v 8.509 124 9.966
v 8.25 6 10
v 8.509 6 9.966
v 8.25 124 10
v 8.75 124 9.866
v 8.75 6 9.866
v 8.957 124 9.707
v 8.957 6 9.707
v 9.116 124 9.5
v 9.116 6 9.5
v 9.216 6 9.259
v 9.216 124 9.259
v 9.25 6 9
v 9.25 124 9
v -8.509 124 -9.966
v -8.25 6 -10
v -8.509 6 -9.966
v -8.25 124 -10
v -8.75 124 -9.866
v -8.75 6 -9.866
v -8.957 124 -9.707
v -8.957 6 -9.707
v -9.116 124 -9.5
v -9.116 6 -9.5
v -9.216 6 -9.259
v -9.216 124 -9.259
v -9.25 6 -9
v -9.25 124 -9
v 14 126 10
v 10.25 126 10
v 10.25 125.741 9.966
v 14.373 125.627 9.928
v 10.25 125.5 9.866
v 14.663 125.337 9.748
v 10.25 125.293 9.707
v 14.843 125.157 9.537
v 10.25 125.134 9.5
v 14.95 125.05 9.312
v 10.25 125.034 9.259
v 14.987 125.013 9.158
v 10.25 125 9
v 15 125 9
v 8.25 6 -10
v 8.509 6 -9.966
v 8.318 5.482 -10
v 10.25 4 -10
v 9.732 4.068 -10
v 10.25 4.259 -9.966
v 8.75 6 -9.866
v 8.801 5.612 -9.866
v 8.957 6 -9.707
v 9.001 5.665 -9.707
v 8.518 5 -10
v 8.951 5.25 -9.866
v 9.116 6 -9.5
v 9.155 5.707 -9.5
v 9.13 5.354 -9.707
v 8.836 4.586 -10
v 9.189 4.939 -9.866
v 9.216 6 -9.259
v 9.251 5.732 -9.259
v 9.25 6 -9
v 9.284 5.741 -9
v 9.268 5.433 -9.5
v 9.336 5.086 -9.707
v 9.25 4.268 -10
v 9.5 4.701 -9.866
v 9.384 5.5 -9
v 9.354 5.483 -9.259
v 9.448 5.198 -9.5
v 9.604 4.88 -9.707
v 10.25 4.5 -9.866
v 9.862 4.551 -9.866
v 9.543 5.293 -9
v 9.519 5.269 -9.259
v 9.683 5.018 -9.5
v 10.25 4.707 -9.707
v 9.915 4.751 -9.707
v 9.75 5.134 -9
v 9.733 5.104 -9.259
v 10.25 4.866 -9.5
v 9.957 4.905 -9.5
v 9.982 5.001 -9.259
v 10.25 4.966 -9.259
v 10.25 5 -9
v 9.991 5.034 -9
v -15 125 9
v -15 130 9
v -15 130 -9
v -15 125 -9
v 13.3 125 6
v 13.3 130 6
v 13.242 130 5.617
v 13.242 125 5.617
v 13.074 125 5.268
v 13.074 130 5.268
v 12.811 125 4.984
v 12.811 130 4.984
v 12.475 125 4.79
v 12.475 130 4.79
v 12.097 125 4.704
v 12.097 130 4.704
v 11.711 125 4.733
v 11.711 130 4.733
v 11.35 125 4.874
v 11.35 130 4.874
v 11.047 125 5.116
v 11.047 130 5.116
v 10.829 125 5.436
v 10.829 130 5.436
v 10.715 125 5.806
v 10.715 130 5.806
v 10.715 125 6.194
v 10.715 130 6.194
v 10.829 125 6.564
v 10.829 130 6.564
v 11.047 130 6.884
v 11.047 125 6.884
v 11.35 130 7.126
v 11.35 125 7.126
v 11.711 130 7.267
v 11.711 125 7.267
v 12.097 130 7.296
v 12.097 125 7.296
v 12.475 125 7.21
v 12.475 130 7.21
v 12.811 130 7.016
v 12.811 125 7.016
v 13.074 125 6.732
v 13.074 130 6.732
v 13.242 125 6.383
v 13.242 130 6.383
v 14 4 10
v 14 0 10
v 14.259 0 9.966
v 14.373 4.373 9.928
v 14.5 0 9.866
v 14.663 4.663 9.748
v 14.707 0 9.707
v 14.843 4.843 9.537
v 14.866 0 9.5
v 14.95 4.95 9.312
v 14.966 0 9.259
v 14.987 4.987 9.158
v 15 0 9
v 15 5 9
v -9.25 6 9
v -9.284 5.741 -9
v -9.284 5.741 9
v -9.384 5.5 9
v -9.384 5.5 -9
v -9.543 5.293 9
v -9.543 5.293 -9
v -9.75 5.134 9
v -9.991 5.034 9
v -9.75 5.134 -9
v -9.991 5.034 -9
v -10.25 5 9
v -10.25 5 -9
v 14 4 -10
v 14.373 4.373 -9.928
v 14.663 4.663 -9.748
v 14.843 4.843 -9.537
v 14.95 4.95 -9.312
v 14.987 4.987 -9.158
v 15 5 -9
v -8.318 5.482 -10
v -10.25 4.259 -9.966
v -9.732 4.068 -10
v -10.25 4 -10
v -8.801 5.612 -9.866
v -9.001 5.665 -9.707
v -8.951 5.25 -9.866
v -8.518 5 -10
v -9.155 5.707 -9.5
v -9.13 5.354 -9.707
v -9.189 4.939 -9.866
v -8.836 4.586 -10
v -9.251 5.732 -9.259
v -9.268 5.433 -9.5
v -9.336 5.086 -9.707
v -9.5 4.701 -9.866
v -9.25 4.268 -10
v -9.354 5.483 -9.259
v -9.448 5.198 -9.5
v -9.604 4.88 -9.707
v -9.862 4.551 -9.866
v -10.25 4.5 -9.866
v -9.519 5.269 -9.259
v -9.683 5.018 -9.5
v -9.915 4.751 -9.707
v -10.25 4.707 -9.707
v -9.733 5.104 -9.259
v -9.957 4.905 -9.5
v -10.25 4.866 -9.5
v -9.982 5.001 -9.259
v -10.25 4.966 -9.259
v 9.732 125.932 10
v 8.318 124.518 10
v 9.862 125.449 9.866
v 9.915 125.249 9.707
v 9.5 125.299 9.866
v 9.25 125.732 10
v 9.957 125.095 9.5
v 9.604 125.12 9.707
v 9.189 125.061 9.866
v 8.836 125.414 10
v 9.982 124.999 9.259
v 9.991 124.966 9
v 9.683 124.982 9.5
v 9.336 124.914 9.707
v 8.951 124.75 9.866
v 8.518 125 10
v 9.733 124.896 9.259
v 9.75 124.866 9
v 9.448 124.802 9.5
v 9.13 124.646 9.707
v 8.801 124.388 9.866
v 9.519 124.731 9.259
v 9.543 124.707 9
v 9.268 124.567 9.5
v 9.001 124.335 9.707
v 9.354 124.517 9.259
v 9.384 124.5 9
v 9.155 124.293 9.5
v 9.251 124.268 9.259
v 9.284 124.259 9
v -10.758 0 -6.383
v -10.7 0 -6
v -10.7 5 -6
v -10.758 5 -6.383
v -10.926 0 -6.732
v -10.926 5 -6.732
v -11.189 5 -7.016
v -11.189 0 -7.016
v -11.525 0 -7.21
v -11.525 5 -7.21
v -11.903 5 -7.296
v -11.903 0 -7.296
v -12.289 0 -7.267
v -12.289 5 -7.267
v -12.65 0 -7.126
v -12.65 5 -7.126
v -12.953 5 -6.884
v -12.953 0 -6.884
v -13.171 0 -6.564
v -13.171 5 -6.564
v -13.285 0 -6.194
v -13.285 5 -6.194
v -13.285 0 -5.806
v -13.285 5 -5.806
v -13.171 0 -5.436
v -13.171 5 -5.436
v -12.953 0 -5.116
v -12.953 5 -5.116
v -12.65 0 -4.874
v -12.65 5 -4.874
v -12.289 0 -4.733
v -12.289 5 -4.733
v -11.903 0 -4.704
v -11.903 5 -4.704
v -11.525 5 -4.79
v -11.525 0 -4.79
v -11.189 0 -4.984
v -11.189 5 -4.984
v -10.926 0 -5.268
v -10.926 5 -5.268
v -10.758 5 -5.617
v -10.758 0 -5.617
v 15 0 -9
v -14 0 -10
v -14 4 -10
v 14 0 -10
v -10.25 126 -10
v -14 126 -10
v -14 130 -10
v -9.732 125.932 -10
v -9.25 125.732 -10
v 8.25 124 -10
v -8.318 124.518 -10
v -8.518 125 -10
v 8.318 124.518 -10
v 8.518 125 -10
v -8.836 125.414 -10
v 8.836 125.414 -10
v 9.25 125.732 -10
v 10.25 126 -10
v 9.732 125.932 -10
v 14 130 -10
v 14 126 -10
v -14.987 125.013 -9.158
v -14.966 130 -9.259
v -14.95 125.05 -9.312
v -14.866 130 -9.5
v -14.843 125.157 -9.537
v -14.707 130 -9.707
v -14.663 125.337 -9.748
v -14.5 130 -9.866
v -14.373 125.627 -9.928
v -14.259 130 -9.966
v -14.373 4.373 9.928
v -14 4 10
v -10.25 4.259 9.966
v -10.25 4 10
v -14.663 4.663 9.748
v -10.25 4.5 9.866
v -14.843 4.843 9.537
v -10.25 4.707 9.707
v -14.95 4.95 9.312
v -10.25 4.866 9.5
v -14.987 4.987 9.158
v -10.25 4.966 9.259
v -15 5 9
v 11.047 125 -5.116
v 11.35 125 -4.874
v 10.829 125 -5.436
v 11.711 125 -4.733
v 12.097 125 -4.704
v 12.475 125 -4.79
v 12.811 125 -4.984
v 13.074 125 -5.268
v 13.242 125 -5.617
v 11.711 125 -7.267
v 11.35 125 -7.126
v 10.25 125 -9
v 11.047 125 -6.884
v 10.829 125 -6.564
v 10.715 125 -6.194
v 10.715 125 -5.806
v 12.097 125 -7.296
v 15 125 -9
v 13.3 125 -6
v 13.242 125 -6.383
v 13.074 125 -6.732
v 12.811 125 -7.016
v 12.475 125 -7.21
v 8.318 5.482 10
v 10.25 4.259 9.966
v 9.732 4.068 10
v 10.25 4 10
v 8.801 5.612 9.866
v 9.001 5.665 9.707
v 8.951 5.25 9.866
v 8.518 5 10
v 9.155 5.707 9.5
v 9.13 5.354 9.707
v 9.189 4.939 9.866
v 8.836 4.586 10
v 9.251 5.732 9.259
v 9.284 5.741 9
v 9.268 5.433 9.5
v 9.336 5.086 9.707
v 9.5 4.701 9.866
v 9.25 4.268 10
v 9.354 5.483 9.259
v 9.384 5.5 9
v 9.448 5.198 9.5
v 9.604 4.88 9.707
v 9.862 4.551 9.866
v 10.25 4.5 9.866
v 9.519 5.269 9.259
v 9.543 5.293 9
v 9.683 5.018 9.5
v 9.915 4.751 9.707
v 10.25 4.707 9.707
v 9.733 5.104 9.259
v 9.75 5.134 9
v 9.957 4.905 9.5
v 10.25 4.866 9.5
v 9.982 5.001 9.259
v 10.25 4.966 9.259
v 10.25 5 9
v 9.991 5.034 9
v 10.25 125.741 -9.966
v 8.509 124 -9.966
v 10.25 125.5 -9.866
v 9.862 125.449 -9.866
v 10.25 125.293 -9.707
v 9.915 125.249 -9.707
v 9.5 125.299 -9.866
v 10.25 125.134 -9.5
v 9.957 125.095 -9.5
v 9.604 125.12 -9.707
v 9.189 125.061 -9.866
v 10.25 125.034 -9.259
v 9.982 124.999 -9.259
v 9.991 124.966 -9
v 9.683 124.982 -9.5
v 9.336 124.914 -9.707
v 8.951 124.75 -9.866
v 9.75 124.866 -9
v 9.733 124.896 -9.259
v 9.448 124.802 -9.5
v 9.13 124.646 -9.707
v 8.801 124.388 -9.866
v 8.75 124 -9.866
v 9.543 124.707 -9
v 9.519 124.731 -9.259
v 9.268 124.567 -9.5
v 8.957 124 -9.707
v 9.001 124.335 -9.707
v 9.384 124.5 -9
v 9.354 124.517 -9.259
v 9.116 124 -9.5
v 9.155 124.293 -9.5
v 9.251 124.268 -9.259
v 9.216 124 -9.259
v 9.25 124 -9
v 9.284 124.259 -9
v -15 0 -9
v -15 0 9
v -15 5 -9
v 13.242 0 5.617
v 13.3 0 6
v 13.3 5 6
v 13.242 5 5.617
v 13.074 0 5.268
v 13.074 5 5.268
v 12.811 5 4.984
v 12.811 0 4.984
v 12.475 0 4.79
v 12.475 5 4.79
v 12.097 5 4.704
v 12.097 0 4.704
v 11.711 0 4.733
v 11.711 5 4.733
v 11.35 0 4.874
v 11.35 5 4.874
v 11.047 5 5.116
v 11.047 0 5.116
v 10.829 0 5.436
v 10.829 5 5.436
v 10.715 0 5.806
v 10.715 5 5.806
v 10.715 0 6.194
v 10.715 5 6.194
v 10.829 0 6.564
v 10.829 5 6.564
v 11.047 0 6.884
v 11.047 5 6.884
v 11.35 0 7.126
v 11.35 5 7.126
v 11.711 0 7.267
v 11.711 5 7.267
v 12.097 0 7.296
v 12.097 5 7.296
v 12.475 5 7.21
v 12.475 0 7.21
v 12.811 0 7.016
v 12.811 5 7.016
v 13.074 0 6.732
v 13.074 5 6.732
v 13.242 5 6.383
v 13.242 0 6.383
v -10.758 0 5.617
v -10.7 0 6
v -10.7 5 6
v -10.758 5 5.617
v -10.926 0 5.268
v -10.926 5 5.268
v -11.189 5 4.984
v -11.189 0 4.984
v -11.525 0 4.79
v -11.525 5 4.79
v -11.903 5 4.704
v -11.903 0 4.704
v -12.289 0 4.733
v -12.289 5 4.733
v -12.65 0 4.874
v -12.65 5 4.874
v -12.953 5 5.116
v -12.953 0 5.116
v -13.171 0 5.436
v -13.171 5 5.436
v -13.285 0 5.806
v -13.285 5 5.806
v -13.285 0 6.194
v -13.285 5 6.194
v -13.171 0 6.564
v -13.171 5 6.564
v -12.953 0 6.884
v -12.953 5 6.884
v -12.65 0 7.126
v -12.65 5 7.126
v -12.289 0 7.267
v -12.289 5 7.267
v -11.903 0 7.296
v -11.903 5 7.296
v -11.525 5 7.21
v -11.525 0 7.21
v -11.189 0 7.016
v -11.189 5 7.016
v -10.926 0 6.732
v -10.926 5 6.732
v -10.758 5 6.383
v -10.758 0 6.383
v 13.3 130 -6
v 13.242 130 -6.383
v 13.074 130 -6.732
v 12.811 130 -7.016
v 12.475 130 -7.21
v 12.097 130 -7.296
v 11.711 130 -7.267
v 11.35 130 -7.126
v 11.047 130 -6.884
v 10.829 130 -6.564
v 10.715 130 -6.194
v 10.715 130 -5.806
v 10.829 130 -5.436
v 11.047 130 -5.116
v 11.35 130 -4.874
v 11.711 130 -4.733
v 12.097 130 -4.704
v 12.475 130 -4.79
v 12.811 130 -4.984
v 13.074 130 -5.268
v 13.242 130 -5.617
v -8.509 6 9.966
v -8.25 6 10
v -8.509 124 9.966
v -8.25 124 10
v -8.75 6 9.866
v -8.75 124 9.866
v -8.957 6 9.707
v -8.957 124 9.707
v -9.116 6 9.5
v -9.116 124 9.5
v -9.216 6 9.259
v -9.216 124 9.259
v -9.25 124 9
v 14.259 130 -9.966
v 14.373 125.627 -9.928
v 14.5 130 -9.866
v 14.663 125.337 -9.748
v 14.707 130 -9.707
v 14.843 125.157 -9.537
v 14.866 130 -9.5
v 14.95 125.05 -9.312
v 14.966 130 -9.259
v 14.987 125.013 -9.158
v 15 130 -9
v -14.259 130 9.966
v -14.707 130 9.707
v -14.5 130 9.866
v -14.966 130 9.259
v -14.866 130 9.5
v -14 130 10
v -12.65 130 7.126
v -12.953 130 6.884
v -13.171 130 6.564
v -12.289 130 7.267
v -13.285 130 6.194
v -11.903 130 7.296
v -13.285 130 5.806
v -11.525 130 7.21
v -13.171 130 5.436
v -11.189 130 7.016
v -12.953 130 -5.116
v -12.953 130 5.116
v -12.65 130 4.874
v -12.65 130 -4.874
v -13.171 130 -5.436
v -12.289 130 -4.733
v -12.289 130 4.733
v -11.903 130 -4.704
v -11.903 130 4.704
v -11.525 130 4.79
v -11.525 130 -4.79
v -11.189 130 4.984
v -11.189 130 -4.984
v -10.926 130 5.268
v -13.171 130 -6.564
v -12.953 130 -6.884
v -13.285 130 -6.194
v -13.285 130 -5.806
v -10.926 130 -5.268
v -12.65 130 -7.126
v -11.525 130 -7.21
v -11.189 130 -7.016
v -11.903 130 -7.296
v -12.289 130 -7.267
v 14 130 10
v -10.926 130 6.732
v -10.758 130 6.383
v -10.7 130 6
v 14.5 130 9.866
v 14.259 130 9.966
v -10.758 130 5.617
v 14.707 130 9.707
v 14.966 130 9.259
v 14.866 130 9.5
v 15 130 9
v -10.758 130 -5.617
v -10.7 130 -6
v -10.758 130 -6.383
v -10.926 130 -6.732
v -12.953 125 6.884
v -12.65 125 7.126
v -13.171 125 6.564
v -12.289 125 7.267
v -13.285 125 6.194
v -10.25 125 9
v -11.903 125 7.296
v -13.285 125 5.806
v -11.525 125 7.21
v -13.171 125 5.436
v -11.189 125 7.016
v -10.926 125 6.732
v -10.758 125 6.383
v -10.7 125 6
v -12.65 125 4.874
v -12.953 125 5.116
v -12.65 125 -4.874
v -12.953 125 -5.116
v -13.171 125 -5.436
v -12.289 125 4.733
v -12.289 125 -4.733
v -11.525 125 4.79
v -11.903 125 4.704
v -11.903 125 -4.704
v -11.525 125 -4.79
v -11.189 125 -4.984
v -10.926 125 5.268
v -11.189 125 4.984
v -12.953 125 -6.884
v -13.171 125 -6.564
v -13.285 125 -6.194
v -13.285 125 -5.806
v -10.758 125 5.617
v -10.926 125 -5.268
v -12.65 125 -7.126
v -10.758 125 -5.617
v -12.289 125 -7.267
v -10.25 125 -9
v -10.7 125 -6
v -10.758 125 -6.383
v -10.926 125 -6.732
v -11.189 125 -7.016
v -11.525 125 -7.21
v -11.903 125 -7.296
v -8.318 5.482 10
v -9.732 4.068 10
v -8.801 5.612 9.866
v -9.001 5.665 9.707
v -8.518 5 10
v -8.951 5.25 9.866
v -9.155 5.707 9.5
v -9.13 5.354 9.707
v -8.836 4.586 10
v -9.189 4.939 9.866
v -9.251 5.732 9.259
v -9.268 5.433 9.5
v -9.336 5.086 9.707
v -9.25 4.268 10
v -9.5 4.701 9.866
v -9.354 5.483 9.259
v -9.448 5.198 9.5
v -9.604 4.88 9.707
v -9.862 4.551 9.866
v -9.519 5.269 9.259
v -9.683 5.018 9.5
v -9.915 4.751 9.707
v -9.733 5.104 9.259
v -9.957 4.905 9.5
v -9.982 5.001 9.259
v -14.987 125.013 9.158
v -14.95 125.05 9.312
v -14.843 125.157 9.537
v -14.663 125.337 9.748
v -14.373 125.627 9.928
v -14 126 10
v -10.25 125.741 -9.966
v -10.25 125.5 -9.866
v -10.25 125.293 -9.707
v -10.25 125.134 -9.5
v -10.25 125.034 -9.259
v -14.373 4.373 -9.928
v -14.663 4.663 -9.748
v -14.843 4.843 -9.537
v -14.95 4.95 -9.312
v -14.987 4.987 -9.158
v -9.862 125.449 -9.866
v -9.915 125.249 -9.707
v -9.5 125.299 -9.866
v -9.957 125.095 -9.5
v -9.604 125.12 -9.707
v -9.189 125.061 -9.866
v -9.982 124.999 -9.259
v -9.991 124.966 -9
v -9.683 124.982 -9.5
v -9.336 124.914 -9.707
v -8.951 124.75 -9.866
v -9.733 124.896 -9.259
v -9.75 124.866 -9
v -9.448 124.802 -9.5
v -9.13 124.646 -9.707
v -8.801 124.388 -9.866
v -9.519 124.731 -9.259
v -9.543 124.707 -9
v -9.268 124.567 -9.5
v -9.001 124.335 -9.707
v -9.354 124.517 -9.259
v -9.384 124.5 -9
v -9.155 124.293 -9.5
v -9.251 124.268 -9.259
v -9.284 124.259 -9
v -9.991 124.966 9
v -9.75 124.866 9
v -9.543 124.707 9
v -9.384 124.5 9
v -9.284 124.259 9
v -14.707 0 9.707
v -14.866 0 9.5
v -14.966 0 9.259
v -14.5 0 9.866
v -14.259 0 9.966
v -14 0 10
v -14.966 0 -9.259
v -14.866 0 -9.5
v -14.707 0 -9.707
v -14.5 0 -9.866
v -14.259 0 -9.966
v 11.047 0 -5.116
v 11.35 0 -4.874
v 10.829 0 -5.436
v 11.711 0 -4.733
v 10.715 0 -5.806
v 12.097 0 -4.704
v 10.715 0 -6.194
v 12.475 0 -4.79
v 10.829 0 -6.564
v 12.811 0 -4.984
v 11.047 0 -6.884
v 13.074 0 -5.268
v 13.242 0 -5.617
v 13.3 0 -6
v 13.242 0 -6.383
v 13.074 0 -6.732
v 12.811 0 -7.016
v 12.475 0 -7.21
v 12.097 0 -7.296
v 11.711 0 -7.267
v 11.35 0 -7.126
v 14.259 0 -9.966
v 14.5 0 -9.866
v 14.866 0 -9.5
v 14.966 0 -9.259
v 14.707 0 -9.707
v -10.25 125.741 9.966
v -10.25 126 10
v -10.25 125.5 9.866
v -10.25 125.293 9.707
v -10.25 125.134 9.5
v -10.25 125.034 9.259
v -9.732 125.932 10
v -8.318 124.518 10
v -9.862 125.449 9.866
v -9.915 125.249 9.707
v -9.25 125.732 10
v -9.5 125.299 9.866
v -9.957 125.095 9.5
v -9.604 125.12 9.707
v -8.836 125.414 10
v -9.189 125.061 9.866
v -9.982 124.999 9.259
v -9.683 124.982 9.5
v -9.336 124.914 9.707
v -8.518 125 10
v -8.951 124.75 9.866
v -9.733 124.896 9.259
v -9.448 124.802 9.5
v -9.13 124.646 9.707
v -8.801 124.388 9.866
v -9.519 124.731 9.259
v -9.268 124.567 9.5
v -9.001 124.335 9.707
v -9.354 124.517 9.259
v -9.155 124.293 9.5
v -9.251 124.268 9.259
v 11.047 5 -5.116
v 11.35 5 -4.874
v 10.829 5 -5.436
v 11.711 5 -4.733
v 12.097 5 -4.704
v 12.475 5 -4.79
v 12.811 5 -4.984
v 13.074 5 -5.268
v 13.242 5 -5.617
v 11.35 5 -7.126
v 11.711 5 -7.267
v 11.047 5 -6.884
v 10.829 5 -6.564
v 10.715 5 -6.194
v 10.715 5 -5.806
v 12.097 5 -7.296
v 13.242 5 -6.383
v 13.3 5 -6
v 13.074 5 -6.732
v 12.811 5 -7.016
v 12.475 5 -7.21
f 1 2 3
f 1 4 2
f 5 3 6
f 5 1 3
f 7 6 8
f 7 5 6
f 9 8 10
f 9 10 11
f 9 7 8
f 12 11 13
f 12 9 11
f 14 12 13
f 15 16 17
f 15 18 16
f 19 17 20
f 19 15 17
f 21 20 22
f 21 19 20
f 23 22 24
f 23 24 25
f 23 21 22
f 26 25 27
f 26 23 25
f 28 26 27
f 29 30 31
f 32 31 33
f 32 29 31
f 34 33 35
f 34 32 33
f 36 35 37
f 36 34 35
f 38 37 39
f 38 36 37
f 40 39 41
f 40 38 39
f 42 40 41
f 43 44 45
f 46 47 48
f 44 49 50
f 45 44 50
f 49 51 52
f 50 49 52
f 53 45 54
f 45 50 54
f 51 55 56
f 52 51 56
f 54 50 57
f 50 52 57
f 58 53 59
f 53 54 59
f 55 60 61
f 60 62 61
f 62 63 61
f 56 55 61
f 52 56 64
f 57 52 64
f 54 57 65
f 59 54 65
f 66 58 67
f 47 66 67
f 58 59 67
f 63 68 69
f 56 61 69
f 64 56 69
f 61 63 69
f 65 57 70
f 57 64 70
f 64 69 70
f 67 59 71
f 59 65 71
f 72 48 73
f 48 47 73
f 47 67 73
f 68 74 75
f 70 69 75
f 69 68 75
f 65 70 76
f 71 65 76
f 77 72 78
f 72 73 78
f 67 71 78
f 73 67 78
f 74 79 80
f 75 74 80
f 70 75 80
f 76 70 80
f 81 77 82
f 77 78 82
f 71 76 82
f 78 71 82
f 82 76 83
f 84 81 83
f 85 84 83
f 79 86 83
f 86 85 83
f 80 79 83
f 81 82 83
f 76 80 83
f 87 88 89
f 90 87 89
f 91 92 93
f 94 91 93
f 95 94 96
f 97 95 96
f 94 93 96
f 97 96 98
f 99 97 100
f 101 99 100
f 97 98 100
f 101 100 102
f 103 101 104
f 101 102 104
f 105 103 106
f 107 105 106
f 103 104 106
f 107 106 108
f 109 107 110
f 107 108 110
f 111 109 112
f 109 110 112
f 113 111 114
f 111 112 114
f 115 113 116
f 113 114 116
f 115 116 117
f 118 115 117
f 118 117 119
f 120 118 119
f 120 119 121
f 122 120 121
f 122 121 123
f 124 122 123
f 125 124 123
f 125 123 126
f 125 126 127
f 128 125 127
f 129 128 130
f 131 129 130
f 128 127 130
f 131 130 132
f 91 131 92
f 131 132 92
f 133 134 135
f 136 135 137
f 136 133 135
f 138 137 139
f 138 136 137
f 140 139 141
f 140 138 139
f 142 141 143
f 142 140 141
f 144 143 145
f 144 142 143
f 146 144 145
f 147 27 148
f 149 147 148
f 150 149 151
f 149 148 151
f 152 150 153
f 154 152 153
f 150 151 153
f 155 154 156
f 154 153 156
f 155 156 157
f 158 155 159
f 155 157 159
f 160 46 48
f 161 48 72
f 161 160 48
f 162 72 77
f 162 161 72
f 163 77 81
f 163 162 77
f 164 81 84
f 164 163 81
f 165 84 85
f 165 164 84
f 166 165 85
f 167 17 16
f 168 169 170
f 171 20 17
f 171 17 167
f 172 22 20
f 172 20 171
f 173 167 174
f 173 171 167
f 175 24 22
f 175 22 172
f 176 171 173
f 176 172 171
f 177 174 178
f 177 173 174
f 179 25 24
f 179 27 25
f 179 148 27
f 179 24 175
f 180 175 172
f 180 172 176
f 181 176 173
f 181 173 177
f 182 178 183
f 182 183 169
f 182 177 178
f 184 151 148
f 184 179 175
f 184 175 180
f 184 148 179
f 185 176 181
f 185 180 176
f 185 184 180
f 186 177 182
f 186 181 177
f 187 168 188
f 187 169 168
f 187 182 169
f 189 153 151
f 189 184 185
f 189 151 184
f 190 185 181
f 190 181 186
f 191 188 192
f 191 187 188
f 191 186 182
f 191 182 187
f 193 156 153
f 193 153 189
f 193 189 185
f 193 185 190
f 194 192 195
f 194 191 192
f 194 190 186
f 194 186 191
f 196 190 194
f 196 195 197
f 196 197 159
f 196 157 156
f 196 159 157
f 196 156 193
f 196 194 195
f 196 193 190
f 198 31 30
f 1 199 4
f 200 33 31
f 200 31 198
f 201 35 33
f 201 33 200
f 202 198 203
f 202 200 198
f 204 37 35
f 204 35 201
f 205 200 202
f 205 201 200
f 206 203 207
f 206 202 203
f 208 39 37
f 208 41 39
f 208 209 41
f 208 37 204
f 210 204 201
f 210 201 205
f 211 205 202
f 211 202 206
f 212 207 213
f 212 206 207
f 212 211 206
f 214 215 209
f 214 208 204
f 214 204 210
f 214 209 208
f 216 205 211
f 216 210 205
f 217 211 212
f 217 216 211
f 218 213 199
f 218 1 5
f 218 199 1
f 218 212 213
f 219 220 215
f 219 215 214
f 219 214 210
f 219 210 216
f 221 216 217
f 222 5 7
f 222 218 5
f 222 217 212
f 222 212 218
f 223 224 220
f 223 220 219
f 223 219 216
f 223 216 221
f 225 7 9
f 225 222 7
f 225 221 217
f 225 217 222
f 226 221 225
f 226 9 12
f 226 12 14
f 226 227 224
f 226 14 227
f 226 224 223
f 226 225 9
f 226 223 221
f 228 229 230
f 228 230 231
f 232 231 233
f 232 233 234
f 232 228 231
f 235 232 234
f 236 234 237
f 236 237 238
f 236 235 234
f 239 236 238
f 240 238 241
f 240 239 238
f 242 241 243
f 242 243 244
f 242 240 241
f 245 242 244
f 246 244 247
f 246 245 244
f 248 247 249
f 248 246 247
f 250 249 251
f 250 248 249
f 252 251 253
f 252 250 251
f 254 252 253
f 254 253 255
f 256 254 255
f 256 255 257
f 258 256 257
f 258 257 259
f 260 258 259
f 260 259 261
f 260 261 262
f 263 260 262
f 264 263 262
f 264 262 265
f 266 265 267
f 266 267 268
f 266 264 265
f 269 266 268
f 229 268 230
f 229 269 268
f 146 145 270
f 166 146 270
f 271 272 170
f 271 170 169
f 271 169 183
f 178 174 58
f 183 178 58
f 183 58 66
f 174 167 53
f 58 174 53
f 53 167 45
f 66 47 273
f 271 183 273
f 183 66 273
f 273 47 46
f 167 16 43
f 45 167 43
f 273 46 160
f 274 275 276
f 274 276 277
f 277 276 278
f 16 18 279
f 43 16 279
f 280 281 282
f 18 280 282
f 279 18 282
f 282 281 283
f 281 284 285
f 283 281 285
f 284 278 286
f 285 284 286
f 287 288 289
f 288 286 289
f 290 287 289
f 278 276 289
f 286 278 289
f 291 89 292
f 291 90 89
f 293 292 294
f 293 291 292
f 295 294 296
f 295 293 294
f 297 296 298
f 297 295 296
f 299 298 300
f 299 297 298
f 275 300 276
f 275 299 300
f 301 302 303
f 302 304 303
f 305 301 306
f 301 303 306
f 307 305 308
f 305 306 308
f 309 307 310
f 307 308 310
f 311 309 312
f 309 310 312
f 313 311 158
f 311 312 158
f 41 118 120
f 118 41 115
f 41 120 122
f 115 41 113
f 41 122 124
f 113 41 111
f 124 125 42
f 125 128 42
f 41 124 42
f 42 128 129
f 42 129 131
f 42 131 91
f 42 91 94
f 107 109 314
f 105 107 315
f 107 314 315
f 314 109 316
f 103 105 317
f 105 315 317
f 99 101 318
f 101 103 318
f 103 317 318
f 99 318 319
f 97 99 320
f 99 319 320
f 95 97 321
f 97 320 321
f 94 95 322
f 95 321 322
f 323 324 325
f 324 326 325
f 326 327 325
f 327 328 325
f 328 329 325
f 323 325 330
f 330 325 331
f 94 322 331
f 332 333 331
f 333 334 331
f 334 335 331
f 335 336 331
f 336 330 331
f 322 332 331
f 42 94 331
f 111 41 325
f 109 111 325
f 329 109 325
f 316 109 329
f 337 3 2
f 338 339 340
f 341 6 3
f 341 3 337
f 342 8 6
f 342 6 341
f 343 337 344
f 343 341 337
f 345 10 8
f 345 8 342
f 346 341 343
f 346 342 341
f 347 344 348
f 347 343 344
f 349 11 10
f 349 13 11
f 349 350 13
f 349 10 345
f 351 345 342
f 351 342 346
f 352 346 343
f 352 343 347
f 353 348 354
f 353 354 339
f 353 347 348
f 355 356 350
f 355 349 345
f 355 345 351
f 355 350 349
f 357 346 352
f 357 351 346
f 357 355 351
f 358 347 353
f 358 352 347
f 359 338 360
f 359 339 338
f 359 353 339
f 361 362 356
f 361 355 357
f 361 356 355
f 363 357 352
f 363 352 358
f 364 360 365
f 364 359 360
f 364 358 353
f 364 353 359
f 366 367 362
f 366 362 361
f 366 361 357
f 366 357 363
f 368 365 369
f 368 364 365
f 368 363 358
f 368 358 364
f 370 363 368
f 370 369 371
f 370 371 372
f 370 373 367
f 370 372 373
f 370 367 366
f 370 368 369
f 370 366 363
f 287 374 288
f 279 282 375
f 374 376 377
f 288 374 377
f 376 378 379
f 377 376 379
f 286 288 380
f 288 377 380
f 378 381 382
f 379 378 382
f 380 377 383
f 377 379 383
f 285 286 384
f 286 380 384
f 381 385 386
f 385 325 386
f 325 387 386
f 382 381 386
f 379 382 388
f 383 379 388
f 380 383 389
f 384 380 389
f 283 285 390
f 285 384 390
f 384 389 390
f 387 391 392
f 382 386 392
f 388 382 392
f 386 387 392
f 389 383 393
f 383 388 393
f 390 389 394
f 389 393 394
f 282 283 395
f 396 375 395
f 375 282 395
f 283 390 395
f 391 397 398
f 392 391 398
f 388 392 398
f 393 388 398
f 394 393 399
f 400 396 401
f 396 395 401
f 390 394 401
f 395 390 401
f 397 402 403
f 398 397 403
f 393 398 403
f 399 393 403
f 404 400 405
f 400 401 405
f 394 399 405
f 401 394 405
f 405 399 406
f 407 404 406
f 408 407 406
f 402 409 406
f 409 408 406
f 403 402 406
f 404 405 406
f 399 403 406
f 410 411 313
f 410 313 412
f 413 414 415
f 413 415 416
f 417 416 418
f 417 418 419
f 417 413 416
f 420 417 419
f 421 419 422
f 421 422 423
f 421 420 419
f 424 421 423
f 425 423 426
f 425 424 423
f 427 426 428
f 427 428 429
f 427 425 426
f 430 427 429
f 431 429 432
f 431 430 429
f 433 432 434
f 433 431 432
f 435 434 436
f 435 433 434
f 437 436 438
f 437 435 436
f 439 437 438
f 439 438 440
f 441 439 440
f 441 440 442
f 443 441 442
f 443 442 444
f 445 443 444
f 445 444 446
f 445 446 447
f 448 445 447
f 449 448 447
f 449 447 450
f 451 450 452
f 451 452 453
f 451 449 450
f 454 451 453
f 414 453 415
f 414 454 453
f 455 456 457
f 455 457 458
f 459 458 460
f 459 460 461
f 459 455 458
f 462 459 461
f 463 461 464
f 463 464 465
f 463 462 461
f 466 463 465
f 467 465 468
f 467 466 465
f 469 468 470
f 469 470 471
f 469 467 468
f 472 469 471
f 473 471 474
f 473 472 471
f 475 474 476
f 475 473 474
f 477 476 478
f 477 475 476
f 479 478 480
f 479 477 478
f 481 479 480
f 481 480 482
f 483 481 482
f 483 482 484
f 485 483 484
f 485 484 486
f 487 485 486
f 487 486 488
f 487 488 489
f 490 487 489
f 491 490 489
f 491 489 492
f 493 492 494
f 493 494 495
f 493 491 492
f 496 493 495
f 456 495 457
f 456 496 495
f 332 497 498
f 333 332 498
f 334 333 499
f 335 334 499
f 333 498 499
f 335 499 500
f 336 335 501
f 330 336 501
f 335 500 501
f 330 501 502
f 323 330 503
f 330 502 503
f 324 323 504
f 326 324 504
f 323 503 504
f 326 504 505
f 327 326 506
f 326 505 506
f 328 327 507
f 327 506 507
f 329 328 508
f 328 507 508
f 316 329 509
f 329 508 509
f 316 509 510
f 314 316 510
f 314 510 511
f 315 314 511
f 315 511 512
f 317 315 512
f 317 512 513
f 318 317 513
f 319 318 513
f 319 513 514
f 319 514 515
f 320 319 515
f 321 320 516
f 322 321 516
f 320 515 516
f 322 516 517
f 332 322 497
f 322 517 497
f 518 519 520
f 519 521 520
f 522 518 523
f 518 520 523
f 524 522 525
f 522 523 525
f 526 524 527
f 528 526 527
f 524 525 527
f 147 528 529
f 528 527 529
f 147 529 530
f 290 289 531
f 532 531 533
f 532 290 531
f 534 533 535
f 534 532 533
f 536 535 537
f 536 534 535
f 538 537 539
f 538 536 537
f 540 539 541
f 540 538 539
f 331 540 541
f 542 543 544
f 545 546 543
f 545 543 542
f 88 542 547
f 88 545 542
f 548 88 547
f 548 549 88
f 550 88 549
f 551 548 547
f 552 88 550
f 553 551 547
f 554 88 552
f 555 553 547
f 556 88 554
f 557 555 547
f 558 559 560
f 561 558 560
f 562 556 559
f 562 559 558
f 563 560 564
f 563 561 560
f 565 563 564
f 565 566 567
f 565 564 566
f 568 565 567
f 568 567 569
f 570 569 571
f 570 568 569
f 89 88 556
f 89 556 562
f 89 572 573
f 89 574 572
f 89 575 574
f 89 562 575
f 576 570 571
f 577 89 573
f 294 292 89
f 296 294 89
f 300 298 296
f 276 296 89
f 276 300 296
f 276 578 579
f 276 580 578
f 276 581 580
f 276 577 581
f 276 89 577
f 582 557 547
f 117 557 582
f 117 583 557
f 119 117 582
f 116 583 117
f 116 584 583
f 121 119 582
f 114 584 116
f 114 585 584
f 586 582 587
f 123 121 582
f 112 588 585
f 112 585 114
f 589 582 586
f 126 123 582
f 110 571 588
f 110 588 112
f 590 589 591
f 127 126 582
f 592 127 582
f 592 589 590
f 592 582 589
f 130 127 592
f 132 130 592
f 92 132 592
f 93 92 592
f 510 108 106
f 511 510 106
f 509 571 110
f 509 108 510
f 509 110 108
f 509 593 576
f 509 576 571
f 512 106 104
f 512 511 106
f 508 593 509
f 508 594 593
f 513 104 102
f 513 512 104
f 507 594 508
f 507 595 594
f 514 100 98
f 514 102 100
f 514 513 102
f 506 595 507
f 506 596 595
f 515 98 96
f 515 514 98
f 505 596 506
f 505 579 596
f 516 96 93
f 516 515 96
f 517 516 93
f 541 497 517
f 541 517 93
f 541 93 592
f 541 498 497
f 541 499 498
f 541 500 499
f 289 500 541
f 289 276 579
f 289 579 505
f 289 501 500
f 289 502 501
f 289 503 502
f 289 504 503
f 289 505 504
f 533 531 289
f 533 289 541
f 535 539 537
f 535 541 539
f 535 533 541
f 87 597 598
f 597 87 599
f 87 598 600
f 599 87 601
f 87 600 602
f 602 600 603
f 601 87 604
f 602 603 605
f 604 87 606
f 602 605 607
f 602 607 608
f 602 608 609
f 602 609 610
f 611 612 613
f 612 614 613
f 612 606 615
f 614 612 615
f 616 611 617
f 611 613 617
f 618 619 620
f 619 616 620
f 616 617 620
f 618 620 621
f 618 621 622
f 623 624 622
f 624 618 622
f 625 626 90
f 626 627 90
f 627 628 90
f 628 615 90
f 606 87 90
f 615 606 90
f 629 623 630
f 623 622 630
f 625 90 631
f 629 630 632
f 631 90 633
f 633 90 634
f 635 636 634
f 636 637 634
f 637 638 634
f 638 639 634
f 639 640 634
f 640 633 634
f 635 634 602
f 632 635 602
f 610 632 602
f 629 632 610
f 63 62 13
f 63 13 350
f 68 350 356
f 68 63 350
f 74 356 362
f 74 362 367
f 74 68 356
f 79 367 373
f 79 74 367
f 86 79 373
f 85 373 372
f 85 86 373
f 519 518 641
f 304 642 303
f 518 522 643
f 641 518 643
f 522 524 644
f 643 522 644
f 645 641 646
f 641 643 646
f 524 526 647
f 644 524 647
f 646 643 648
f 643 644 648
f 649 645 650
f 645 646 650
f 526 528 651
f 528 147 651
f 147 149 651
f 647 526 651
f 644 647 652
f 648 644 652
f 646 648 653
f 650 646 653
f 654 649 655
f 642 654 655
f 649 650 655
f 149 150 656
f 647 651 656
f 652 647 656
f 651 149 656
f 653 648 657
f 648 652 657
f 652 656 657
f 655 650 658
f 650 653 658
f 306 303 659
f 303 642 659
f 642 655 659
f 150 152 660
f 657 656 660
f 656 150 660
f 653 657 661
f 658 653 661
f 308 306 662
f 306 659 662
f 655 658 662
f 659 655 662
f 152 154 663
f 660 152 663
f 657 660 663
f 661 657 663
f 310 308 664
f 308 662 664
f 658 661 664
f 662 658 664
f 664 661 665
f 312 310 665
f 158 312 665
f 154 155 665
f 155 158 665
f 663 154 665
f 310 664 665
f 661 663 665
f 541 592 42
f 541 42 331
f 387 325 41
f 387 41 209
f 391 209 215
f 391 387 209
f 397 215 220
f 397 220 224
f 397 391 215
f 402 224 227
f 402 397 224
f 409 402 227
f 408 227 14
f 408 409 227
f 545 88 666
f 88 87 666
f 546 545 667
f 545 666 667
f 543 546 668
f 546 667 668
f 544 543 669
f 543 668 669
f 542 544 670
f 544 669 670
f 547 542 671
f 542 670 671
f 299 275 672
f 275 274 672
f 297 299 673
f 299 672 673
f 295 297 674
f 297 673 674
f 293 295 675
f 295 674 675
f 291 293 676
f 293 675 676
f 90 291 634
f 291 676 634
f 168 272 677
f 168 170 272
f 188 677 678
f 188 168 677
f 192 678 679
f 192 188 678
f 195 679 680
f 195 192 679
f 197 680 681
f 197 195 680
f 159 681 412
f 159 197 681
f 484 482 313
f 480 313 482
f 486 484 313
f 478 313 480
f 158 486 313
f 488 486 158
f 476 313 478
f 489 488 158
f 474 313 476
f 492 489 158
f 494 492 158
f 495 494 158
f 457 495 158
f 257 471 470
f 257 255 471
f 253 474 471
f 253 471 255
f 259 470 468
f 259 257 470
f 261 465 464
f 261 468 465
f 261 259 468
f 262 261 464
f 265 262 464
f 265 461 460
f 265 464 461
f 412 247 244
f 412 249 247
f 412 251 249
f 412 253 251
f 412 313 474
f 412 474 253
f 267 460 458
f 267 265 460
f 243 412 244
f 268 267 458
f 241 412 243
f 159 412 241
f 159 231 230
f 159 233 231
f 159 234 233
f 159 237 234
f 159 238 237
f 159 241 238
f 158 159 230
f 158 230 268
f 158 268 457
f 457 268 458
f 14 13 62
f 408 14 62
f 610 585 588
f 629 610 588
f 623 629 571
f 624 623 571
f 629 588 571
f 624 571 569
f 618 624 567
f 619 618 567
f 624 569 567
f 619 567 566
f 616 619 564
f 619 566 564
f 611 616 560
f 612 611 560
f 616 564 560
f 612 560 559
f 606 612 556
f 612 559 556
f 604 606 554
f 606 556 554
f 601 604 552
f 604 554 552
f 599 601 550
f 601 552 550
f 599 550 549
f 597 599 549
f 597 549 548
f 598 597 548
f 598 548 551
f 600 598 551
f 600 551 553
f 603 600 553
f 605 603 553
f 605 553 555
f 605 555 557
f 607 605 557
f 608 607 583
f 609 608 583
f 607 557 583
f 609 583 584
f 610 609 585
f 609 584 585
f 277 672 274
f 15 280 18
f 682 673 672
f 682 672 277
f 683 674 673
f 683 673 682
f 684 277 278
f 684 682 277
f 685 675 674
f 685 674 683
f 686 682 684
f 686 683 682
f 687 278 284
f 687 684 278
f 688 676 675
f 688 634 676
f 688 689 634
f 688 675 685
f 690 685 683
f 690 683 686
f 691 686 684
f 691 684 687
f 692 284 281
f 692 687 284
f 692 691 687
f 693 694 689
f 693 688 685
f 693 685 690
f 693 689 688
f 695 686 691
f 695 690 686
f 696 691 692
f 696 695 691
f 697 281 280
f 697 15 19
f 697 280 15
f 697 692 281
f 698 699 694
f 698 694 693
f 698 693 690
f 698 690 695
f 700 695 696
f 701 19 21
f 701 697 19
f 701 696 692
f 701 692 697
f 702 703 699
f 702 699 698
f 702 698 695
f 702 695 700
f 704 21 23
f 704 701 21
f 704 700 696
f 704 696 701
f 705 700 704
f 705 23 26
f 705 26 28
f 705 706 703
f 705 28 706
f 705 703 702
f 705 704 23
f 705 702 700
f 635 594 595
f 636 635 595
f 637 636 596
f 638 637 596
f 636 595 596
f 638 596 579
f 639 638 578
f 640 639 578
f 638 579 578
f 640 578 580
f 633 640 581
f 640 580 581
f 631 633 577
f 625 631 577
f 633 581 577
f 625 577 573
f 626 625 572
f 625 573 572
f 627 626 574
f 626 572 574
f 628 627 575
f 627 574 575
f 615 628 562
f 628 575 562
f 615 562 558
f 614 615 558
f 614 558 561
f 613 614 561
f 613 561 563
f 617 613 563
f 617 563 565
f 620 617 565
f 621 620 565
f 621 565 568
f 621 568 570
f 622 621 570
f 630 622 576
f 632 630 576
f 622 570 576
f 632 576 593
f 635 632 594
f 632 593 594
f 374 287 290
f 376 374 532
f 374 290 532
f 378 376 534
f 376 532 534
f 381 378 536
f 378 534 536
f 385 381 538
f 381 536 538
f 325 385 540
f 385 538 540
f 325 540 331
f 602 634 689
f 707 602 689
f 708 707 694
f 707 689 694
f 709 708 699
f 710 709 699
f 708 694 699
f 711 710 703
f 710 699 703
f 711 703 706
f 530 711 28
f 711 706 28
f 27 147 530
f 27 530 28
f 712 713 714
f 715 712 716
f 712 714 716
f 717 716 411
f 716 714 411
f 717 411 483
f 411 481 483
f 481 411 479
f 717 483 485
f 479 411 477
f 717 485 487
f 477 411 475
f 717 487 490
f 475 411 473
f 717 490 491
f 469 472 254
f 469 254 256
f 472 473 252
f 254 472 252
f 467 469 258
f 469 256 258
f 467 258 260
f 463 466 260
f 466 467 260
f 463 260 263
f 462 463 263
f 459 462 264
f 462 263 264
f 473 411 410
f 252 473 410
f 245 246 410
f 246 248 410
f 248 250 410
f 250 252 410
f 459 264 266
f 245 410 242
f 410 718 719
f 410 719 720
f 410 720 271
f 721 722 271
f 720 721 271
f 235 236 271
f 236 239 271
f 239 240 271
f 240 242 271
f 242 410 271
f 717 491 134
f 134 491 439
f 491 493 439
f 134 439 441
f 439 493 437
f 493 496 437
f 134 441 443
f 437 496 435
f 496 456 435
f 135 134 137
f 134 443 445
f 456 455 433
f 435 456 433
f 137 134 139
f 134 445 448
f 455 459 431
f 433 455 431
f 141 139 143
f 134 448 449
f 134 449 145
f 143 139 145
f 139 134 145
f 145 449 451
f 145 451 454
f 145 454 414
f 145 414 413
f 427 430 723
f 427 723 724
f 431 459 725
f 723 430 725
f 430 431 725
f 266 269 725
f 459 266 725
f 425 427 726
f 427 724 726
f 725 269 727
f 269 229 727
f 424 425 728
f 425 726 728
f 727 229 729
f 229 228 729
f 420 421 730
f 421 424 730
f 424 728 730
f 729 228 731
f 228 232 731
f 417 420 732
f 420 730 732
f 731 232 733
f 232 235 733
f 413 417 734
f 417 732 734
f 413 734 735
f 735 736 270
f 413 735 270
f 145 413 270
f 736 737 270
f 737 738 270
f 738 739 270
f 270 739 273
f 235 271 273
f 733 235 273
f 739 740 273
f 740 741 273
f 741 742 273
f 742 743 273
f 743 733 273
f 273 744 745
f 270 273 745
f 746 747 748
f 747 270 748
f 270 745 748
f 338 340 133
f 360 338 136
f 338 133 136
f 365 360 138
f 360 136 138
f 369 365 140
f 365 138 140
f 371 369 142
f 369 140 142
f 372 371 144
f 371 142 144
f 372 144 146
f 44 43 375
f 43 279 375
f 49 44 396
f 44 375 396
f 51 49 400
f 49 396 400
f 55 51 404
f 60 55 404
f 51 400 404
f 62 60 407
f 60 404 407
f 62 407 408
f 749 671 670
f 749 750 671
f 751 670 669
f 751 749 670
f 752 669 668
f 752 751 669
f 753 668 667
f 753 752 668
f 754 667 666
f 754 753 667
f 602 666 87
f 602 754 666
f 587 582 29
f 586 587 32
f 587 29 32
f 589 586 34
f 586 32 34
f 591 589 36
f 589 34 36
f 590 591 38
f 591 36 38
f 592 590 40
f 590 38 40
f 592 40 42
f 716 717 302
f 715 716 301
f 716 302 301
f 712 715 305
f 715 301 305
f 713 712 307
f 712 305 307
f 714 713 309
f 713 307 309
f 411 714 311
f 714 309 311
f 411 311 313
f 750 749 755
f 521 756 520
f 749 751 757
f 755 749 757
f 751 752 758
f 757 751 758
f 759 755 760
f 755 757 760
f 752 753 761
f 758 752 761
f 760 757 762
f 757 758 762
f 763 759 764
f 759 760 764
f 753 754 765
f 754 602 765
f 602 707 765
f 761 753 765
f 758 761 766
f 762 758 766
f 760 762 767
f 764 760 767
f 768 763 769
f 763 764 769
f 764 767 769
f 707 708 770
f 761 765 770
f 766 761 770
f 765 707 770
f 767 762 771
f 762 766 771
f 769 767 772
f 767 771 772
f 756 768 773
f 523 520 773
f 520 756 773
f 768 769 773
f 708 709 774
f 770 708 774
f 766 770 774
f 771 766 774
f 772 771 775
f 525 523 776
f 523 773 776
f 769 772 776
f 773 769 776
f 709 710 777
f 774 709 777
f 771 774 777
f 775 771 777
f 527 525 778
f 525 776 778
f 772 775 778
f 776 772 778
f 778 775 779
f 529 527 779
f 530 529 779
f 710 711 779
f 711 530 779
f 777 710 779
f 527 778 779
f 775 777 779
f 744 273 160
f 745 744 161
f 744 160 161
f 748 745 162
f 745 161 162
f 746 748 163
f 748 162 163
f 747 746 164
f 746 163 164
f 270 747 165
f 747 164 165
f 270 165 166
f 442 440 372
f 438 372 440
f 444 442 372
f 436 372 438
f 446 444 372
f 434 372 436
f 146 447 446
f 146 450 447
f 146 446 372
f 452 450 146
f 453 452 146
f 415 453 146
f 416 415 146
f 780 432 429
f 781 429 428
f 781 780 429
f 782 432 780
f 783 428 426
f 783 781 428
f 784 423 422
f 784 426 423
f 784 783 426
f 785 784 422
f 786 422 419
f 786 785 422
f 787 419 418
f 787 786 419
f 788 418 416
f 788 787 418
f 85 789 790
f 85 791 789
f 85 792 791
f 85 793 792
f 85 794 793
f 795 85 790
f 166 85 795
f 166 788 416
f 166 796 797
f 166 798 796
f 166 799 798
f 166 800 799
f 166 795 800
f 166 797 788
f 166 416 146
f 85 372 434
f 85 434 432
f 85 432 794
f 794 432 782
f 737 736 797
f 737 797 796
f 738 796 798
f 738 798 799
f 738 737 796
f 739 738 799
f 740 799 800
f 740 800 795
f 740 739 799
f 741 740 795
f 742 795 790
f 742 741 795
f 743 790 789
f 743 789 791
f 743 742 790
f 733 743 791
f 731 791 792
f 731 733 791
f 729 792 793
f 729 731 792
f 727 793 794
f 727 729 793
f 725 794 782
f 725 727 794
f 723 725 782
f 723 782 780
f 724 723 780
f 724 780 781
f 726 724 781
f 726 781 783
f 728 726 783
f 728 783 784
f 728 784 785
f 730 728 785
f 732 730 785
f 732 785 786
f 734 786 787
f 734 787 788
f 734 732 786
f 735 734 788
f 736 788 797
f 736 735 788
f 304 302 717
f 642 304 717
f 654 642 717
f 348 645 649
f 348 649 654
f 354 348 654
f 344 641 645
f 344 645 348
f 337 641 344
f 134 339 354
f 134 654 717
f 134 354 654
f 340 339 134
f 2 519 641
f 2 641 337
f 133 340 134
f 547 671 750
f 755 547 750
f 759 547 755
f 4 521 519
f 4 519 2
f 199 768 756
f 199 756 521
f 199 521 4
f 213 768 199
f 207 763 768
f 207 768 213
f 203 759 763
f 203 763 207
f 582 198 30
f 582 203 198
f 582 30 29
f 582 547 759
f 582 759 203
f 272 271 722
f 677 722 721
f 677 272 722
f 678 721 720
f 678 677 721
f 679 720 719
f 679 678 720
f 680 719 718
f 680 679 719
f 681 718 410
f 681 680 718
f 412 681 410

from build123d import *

# Parameters (mm, degrees)
SKETCH1_W           = 30
SKETCH1_H           = 20
SKETCH1_R           = 1.3
BOSS_EXTRUDE1_DEPTH = 5
SKETCH2_W           = 18.5
SKETCH2_H           = 20
BOSS_EXTRUDE2_DEPTH = 120
FILLET1_R           = 1


with BuildPart() as part:
    # Sketch1 → Boss-Extrude1 (new body)
    with BuildSketch(Plane(origin=(0, 0, 0), x_dir=(1, 0, 0), z_dir=(0, 1, 0))):
        Rectangle(SKETCH1_W, SKETCH1_H)
        with Locations((-12, 6)):
            Circle(SKETCH1_R, mode=Mode.SUBTRACT)
        with Locations((12, 6)):
            Circle(SKETCH1_R, mode=Mode.SUBTRACT)
        with Locations((12, -6)):
            Circle(SKETCH1_R, mode=Mode.SUBTRACT)
        with Locations((-12, -6)):
            Circle(SKETCH1_R, mode=Mode.SUBTRACT)
    boss_extrude1 = extrude(amount=BOSS_EXTRUDE1_DEPTH)

    # Sketch2 → Boss-Extrude2 (add)
    with BuildSketch(Plane(origin=(0, 5, 0), x_dir=(1, 0, 0), z_dir=(0, 1, 0))):
        Rectangle(SKETCH2_W, SKETCH2_H)
    extrude(amount=BOSS_EXTRUDE2_DEPTH)

    # Mirror1: Boss-Extrude1 across plane
    add(boss_extrude1.mirror(Plane.ZX.offset(65)))

    # Fillet1
    fillet1_edges = [part.edges().sort_by_distance(p)[0] for p in [
        (-12.125, 5, 10),
        (-12.125, 5, -10),
        (12.125, 5, 10),
        (9.25, 5, 0),
        (9.25, 65, 10),
        (9.25, 65, -10),
        (-9.25, 5, 0),
        (-9.25, 65, -10),
        (-9.25, 65, 10),
        (9.25, 125, 0),
        (-9.25, 125, 0),
        (15, 127.5, -10),
        (-12.125, 125, 10),
        (12.125, 125, 10),
        (15, 127.5, 10),
        (-15, 127.5, 10),
        (12.125, 125, -10),
        (-12.125, 125, -10),
        (-15, 127.5, -10),
        (15, 2.5, 10),
        (-15, 2.5, 10),
        (-15, 2.5, -10),
        (15, 2.5, -10),
        (12.125, 5, -10),
    ]]
    fillet(fillet1_edges, radius=FILLET1_R)


solid = part.part
